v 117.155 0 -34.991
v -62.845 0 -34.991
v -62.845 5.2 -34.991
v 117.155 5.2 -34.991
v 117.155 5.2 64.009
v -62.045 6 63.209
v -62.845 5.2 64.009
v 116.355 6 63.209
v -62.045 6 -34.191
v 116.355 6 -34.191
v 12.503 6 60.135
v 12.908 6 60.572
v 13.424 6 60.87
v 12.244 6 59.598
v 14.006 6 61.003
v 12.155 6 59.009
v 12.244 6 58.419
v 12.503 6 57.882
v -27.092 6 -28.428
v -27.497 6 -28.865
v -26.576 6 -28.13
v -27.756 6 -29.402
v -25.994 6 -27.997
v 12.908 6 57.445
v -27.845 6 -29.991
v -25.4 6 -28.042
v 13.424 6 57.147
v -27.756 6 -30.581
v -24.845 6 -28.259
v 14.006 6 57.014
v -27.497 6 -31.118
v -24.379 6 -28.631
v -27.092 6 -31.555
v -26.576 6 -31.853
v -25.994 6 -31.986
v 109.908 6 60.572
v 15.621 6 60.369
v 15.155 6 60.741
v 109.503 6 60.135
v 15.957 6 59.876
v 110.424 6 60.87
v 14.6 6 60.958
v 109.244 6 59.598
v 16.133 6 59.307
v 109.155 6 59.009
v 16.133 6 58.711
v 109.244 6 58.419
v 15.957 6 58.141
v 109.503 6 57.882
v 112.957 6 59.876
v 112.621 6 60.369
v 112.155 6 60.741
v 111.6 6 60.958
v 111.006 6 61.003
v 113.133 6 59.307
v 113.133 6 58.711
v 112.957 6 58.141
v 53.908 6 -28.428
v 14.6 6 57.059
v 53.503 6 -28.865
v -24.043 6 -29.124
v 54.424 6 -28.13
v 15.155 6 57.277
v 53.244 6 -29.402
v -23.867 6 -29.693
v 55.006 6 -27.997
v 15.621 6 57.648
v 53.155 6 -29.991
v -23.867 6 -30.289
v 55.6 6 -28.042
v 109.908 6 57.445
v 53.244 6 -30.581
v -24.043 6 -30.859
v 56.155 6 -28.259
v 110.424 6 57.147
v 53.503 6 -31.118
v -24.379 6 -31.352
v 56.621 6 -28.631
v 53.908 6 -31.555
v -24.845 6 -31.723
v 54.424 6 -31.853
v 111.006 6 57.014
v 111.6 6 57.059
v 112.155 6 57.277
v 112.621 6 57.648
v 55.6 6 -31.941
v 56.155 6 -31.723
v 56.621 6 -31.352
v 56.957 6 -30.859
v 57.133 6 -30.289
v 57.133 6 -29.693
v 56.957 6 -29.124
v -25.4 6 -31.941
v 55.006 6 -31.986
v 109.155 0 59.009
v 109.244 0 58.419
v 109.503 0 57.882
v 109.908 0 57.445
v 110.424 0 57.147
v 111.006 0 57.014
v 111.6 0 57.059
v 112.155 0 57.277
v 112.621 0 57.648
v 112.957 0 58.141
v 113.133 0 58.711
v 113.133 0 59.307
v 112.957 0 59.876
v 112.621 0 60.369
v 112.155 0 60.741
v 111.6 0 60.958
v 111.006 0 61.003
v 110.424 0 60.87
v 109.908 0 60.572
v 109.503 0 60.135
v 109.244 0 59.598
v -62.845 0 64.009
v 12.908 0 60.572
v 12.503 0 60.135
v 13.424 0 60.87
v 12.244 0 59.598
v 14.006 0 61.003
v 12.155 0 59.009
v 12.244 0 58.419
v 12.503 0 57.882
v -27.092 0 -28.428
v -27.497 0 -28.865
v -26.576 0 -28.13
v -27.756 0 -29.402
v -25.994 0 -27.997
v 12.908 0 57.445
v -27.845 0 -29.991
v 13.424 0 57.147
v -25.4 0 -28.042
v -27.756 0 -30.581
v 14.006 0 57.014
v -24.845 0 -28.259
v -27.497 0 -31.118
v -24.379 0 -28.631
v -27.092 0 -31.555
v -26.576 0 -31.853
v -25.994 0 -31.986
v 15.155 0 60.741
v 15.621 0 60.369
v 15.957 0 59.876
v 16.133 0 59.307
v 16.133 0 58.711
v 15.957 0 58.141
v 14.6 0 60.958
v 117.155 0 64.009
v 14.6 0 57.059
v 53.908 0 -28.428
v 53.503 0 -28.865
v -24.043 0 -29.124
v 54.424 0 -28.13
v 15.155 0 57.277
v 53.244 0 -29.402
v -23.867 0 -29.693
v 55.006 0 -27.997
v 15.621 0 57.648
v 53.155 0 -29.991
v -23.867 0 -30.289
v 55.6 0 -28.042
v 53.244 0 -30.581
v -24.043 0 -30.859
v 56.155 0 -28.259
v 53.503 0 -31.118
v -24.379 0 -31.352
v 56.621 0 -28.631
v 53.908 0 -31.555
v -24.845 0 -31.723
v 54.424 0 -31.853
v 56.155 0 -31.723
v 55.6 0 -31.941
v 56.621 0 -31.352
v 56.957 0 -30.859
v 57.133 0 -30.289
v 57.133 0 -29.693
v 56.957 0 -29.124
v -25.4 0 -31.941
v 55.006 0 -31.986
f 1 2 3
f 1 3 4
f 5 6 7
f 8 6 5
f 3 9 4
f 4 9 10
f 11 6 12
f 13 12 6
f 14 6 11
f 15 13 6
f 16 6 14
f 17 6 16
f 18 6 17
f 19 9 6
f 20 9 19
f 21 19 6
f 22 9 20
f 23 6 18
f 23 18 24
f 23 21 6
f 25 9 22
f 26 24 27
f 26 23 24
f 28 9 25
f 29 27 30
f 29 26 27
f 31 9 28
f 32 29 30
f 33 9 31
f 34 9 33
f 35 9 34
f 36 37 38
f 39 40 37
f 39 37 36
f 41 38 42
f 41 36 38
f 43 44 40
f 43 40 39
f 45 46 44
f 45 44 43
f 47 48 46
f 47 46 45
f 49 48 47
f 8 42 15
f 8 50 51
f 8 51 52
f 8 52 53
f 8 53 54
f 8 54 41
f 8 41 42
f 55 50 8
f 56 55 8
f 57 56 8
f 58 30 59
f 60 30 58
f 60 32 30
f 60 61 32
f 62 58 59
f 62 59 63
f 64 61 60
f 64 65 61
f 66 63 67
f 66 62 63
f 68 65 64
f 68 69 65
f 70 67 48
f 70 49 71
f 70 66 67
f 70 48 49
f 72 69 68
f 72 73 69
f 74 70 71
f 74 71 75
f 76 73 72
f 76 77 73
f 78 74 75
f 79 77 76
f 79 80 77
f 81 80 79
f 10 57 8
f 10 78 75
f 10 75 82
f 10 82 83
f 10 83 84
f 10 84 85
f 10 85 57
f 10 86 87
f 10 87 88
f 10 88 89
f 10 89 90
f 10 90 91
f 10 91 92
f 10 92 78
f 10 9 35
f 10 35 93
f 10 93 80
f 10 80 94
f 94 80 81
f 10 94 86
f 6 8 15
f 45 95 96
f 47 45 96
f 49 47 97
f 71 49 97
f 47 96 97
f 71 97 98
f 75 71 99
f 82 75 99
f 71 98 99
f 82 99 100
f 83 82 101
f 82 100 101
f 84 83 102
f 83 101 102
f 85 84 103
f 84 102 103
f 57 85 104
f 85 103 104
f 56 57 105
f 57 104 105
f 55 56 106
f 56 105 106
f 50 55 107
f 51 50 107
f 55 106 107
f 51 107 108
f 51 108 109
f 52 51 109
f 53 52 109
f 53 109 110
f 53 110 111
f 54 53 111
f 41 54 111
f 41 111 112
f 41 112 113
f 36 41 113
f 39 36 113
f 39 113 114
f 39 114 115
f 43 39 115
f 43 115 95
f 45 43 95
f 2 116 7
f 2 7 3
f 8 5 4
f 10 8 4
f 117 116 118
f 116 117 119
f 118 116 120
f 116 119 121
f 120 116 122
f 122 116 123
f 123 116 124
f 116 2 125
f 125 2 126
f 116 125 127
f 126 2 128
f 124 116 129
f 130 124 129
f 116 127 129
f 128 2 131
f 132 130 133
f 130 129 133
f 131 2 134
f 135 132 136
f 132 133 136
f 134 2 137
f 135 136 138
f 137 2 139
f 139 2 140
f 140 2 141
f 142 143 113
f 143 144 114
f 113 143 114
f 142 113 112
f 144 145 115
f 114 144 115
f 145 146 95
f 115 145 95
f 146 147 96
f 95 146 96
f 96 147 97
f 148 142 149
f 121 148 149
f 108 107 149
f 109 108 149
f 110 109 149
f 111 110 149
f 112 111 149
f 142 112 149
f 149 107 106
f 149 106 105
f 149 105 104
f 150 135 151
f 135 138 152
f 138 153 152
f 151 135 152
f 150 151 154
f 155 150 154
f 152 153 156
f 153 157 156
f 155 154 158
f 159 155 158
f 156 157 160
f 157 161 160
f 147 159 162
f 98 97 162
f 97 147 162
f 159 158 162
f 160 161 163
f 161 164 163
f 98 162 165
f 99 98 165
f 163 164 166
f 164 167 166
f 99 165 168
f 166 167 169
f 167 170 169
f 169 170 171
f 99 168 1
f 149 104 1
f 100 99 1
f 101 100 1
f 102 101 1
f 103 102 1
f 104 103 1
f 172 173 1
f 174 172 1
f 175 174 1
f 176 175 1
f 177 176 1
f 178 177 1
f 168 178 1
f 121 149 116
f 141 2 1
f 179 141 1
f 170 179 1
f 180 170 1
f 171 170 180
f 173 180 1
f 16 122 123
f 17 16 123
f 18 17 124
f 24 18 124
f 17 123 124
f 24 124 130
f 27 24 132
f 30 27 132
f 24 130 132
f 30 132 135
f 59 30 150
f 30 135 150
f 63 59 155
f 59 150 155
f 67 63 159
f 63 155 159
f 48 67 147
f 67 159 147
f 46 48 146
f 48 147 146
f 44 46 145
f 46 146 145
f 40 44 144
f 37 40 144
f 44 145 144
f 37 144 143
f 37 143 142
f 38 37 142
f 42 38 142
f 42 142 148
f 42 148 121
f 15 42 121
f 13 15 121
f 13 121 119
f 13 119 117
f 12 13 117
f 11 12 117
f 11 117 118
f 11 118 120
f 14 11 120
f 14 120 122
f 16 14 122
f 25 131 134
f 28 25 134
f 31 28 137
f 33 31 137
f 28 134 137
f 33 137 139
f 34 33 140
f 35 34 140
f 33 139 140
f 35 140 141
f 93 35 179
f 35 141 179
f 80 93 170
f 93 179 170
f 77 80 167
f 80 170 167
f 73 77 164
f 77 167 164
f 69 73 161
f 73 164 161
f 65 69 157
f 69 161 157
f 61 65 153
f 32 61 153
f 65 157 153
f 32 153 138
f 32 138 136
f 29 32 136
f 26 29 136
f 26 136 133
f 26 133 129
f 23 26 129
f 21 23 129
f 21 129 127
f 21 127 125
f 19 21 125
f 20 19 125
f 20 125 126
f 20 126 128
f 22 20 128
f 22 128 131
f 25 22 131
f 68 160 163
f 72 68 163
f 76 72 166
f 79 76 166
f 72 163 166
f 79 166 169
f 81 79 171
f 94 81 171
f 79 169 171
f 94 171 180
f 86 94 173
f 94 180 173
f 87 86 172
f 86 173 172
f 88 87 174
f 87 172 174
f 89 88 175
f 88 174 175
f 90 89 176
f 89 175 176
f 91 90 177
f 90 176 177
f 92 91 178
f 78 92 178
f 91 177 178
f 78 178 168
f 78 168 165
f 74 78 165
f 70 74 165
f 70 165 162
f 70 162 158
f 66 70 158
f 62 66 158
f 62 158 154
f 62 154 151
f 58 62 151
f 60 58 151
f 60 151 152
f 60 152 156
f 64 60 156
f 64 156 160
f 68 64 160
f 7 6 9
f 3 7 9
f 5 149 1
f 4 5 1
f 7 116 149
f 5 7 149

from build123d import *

# Parameters (mm, degrees)
SKETCH1_W                = 180
SKETCH1_H                = 99
BOSS_EXTRUDE1_DEPTH      = 6
F_4_0_4_DIAMETER_HOLE1_D = 4
F_4_0_4_DIAMETER_HOLE2_D = 4
LPATTERN1_COUNT          = 2
LPATTERN1_PITCH          = 97
LPATTERN2_COUNT          = 2
LPATTERN2_PITCH          = 81
CHAMFER1_SIZE            = 0.8


with BuildPart() as part:
    # Sketch1 → Boss-Extrude1 (new body)
    with BuildSketch(Plane(origin=(0, 0, 0), x_dir=(1, 0, 0), z_dir=(0, 1, 0))):
        with Locations((27.155172414, -14.50862069)):
            Rectangle(SKETCH1_W, SKETCH1_H)
    extrude(amount=BOSS_EXTRUDE1_DEPTH)

    # Ø4.0 (4) Diameter Hole1 (through all)
    with Locations(Plane(origin=(0, 6, 0), x_dir=(1, 0, 0), z_dir=(0, 1, 0))):
        with Locations((111.155172414, -59.00862069)):
            f_4_0_4_diameter_hole1 = Hole(F_4_0_4_DIAMETER_HOLE1_D / 2)

    # Ø4.0 (4) Diameter Hole2 (through all)
    with Locations(Plane(origin=(0, 6, 0), x_dir=(1, 0, 0), z_dir=(0, 1, 0))):
        with Locations((55.155172414, 29.99137931)):
            f_4_0_4_diameter_hole2 = Hole(F_4_0_4_DIAMETER_HOLE2_D / 2)

    # LPattern1: Ø4.0 (4) Diameter Hole1 ×2
    with Locations(*[(-i * LPATTERN1_PITCH, 0, 0) for i in range(1, LPATTERN1_COUNT)]):
        add(f_4_0_4_diameter_hole1, mode=Mode.SUBTRACT)

    # LPattern2: Ø4.0 (4) Diameter Hole2 ×2
    with Locations(*[(-i * LPATTERN2_PITCH, 0, 0) for i in range(1, LPATTERN2_COUNT)]):
        add(f_4_0_4_diameter_hole2, mode=Mode.SUBTRACT)

    # Chamfer1
    chamfer1_edges = [part.edges().sort_by_distance(p)[0] for p in [
        (117.155172414, 6, 14.50862069),
        (27.155172414, 6, -34.99137931),
        (-62.844827586, 6, 14.50862069),
        (27.155172414, 6, 64.00862069),
    ]]
    chamfer(chamfer1_edges, length=CHAMFER1_SIZE)


solid = part.part
